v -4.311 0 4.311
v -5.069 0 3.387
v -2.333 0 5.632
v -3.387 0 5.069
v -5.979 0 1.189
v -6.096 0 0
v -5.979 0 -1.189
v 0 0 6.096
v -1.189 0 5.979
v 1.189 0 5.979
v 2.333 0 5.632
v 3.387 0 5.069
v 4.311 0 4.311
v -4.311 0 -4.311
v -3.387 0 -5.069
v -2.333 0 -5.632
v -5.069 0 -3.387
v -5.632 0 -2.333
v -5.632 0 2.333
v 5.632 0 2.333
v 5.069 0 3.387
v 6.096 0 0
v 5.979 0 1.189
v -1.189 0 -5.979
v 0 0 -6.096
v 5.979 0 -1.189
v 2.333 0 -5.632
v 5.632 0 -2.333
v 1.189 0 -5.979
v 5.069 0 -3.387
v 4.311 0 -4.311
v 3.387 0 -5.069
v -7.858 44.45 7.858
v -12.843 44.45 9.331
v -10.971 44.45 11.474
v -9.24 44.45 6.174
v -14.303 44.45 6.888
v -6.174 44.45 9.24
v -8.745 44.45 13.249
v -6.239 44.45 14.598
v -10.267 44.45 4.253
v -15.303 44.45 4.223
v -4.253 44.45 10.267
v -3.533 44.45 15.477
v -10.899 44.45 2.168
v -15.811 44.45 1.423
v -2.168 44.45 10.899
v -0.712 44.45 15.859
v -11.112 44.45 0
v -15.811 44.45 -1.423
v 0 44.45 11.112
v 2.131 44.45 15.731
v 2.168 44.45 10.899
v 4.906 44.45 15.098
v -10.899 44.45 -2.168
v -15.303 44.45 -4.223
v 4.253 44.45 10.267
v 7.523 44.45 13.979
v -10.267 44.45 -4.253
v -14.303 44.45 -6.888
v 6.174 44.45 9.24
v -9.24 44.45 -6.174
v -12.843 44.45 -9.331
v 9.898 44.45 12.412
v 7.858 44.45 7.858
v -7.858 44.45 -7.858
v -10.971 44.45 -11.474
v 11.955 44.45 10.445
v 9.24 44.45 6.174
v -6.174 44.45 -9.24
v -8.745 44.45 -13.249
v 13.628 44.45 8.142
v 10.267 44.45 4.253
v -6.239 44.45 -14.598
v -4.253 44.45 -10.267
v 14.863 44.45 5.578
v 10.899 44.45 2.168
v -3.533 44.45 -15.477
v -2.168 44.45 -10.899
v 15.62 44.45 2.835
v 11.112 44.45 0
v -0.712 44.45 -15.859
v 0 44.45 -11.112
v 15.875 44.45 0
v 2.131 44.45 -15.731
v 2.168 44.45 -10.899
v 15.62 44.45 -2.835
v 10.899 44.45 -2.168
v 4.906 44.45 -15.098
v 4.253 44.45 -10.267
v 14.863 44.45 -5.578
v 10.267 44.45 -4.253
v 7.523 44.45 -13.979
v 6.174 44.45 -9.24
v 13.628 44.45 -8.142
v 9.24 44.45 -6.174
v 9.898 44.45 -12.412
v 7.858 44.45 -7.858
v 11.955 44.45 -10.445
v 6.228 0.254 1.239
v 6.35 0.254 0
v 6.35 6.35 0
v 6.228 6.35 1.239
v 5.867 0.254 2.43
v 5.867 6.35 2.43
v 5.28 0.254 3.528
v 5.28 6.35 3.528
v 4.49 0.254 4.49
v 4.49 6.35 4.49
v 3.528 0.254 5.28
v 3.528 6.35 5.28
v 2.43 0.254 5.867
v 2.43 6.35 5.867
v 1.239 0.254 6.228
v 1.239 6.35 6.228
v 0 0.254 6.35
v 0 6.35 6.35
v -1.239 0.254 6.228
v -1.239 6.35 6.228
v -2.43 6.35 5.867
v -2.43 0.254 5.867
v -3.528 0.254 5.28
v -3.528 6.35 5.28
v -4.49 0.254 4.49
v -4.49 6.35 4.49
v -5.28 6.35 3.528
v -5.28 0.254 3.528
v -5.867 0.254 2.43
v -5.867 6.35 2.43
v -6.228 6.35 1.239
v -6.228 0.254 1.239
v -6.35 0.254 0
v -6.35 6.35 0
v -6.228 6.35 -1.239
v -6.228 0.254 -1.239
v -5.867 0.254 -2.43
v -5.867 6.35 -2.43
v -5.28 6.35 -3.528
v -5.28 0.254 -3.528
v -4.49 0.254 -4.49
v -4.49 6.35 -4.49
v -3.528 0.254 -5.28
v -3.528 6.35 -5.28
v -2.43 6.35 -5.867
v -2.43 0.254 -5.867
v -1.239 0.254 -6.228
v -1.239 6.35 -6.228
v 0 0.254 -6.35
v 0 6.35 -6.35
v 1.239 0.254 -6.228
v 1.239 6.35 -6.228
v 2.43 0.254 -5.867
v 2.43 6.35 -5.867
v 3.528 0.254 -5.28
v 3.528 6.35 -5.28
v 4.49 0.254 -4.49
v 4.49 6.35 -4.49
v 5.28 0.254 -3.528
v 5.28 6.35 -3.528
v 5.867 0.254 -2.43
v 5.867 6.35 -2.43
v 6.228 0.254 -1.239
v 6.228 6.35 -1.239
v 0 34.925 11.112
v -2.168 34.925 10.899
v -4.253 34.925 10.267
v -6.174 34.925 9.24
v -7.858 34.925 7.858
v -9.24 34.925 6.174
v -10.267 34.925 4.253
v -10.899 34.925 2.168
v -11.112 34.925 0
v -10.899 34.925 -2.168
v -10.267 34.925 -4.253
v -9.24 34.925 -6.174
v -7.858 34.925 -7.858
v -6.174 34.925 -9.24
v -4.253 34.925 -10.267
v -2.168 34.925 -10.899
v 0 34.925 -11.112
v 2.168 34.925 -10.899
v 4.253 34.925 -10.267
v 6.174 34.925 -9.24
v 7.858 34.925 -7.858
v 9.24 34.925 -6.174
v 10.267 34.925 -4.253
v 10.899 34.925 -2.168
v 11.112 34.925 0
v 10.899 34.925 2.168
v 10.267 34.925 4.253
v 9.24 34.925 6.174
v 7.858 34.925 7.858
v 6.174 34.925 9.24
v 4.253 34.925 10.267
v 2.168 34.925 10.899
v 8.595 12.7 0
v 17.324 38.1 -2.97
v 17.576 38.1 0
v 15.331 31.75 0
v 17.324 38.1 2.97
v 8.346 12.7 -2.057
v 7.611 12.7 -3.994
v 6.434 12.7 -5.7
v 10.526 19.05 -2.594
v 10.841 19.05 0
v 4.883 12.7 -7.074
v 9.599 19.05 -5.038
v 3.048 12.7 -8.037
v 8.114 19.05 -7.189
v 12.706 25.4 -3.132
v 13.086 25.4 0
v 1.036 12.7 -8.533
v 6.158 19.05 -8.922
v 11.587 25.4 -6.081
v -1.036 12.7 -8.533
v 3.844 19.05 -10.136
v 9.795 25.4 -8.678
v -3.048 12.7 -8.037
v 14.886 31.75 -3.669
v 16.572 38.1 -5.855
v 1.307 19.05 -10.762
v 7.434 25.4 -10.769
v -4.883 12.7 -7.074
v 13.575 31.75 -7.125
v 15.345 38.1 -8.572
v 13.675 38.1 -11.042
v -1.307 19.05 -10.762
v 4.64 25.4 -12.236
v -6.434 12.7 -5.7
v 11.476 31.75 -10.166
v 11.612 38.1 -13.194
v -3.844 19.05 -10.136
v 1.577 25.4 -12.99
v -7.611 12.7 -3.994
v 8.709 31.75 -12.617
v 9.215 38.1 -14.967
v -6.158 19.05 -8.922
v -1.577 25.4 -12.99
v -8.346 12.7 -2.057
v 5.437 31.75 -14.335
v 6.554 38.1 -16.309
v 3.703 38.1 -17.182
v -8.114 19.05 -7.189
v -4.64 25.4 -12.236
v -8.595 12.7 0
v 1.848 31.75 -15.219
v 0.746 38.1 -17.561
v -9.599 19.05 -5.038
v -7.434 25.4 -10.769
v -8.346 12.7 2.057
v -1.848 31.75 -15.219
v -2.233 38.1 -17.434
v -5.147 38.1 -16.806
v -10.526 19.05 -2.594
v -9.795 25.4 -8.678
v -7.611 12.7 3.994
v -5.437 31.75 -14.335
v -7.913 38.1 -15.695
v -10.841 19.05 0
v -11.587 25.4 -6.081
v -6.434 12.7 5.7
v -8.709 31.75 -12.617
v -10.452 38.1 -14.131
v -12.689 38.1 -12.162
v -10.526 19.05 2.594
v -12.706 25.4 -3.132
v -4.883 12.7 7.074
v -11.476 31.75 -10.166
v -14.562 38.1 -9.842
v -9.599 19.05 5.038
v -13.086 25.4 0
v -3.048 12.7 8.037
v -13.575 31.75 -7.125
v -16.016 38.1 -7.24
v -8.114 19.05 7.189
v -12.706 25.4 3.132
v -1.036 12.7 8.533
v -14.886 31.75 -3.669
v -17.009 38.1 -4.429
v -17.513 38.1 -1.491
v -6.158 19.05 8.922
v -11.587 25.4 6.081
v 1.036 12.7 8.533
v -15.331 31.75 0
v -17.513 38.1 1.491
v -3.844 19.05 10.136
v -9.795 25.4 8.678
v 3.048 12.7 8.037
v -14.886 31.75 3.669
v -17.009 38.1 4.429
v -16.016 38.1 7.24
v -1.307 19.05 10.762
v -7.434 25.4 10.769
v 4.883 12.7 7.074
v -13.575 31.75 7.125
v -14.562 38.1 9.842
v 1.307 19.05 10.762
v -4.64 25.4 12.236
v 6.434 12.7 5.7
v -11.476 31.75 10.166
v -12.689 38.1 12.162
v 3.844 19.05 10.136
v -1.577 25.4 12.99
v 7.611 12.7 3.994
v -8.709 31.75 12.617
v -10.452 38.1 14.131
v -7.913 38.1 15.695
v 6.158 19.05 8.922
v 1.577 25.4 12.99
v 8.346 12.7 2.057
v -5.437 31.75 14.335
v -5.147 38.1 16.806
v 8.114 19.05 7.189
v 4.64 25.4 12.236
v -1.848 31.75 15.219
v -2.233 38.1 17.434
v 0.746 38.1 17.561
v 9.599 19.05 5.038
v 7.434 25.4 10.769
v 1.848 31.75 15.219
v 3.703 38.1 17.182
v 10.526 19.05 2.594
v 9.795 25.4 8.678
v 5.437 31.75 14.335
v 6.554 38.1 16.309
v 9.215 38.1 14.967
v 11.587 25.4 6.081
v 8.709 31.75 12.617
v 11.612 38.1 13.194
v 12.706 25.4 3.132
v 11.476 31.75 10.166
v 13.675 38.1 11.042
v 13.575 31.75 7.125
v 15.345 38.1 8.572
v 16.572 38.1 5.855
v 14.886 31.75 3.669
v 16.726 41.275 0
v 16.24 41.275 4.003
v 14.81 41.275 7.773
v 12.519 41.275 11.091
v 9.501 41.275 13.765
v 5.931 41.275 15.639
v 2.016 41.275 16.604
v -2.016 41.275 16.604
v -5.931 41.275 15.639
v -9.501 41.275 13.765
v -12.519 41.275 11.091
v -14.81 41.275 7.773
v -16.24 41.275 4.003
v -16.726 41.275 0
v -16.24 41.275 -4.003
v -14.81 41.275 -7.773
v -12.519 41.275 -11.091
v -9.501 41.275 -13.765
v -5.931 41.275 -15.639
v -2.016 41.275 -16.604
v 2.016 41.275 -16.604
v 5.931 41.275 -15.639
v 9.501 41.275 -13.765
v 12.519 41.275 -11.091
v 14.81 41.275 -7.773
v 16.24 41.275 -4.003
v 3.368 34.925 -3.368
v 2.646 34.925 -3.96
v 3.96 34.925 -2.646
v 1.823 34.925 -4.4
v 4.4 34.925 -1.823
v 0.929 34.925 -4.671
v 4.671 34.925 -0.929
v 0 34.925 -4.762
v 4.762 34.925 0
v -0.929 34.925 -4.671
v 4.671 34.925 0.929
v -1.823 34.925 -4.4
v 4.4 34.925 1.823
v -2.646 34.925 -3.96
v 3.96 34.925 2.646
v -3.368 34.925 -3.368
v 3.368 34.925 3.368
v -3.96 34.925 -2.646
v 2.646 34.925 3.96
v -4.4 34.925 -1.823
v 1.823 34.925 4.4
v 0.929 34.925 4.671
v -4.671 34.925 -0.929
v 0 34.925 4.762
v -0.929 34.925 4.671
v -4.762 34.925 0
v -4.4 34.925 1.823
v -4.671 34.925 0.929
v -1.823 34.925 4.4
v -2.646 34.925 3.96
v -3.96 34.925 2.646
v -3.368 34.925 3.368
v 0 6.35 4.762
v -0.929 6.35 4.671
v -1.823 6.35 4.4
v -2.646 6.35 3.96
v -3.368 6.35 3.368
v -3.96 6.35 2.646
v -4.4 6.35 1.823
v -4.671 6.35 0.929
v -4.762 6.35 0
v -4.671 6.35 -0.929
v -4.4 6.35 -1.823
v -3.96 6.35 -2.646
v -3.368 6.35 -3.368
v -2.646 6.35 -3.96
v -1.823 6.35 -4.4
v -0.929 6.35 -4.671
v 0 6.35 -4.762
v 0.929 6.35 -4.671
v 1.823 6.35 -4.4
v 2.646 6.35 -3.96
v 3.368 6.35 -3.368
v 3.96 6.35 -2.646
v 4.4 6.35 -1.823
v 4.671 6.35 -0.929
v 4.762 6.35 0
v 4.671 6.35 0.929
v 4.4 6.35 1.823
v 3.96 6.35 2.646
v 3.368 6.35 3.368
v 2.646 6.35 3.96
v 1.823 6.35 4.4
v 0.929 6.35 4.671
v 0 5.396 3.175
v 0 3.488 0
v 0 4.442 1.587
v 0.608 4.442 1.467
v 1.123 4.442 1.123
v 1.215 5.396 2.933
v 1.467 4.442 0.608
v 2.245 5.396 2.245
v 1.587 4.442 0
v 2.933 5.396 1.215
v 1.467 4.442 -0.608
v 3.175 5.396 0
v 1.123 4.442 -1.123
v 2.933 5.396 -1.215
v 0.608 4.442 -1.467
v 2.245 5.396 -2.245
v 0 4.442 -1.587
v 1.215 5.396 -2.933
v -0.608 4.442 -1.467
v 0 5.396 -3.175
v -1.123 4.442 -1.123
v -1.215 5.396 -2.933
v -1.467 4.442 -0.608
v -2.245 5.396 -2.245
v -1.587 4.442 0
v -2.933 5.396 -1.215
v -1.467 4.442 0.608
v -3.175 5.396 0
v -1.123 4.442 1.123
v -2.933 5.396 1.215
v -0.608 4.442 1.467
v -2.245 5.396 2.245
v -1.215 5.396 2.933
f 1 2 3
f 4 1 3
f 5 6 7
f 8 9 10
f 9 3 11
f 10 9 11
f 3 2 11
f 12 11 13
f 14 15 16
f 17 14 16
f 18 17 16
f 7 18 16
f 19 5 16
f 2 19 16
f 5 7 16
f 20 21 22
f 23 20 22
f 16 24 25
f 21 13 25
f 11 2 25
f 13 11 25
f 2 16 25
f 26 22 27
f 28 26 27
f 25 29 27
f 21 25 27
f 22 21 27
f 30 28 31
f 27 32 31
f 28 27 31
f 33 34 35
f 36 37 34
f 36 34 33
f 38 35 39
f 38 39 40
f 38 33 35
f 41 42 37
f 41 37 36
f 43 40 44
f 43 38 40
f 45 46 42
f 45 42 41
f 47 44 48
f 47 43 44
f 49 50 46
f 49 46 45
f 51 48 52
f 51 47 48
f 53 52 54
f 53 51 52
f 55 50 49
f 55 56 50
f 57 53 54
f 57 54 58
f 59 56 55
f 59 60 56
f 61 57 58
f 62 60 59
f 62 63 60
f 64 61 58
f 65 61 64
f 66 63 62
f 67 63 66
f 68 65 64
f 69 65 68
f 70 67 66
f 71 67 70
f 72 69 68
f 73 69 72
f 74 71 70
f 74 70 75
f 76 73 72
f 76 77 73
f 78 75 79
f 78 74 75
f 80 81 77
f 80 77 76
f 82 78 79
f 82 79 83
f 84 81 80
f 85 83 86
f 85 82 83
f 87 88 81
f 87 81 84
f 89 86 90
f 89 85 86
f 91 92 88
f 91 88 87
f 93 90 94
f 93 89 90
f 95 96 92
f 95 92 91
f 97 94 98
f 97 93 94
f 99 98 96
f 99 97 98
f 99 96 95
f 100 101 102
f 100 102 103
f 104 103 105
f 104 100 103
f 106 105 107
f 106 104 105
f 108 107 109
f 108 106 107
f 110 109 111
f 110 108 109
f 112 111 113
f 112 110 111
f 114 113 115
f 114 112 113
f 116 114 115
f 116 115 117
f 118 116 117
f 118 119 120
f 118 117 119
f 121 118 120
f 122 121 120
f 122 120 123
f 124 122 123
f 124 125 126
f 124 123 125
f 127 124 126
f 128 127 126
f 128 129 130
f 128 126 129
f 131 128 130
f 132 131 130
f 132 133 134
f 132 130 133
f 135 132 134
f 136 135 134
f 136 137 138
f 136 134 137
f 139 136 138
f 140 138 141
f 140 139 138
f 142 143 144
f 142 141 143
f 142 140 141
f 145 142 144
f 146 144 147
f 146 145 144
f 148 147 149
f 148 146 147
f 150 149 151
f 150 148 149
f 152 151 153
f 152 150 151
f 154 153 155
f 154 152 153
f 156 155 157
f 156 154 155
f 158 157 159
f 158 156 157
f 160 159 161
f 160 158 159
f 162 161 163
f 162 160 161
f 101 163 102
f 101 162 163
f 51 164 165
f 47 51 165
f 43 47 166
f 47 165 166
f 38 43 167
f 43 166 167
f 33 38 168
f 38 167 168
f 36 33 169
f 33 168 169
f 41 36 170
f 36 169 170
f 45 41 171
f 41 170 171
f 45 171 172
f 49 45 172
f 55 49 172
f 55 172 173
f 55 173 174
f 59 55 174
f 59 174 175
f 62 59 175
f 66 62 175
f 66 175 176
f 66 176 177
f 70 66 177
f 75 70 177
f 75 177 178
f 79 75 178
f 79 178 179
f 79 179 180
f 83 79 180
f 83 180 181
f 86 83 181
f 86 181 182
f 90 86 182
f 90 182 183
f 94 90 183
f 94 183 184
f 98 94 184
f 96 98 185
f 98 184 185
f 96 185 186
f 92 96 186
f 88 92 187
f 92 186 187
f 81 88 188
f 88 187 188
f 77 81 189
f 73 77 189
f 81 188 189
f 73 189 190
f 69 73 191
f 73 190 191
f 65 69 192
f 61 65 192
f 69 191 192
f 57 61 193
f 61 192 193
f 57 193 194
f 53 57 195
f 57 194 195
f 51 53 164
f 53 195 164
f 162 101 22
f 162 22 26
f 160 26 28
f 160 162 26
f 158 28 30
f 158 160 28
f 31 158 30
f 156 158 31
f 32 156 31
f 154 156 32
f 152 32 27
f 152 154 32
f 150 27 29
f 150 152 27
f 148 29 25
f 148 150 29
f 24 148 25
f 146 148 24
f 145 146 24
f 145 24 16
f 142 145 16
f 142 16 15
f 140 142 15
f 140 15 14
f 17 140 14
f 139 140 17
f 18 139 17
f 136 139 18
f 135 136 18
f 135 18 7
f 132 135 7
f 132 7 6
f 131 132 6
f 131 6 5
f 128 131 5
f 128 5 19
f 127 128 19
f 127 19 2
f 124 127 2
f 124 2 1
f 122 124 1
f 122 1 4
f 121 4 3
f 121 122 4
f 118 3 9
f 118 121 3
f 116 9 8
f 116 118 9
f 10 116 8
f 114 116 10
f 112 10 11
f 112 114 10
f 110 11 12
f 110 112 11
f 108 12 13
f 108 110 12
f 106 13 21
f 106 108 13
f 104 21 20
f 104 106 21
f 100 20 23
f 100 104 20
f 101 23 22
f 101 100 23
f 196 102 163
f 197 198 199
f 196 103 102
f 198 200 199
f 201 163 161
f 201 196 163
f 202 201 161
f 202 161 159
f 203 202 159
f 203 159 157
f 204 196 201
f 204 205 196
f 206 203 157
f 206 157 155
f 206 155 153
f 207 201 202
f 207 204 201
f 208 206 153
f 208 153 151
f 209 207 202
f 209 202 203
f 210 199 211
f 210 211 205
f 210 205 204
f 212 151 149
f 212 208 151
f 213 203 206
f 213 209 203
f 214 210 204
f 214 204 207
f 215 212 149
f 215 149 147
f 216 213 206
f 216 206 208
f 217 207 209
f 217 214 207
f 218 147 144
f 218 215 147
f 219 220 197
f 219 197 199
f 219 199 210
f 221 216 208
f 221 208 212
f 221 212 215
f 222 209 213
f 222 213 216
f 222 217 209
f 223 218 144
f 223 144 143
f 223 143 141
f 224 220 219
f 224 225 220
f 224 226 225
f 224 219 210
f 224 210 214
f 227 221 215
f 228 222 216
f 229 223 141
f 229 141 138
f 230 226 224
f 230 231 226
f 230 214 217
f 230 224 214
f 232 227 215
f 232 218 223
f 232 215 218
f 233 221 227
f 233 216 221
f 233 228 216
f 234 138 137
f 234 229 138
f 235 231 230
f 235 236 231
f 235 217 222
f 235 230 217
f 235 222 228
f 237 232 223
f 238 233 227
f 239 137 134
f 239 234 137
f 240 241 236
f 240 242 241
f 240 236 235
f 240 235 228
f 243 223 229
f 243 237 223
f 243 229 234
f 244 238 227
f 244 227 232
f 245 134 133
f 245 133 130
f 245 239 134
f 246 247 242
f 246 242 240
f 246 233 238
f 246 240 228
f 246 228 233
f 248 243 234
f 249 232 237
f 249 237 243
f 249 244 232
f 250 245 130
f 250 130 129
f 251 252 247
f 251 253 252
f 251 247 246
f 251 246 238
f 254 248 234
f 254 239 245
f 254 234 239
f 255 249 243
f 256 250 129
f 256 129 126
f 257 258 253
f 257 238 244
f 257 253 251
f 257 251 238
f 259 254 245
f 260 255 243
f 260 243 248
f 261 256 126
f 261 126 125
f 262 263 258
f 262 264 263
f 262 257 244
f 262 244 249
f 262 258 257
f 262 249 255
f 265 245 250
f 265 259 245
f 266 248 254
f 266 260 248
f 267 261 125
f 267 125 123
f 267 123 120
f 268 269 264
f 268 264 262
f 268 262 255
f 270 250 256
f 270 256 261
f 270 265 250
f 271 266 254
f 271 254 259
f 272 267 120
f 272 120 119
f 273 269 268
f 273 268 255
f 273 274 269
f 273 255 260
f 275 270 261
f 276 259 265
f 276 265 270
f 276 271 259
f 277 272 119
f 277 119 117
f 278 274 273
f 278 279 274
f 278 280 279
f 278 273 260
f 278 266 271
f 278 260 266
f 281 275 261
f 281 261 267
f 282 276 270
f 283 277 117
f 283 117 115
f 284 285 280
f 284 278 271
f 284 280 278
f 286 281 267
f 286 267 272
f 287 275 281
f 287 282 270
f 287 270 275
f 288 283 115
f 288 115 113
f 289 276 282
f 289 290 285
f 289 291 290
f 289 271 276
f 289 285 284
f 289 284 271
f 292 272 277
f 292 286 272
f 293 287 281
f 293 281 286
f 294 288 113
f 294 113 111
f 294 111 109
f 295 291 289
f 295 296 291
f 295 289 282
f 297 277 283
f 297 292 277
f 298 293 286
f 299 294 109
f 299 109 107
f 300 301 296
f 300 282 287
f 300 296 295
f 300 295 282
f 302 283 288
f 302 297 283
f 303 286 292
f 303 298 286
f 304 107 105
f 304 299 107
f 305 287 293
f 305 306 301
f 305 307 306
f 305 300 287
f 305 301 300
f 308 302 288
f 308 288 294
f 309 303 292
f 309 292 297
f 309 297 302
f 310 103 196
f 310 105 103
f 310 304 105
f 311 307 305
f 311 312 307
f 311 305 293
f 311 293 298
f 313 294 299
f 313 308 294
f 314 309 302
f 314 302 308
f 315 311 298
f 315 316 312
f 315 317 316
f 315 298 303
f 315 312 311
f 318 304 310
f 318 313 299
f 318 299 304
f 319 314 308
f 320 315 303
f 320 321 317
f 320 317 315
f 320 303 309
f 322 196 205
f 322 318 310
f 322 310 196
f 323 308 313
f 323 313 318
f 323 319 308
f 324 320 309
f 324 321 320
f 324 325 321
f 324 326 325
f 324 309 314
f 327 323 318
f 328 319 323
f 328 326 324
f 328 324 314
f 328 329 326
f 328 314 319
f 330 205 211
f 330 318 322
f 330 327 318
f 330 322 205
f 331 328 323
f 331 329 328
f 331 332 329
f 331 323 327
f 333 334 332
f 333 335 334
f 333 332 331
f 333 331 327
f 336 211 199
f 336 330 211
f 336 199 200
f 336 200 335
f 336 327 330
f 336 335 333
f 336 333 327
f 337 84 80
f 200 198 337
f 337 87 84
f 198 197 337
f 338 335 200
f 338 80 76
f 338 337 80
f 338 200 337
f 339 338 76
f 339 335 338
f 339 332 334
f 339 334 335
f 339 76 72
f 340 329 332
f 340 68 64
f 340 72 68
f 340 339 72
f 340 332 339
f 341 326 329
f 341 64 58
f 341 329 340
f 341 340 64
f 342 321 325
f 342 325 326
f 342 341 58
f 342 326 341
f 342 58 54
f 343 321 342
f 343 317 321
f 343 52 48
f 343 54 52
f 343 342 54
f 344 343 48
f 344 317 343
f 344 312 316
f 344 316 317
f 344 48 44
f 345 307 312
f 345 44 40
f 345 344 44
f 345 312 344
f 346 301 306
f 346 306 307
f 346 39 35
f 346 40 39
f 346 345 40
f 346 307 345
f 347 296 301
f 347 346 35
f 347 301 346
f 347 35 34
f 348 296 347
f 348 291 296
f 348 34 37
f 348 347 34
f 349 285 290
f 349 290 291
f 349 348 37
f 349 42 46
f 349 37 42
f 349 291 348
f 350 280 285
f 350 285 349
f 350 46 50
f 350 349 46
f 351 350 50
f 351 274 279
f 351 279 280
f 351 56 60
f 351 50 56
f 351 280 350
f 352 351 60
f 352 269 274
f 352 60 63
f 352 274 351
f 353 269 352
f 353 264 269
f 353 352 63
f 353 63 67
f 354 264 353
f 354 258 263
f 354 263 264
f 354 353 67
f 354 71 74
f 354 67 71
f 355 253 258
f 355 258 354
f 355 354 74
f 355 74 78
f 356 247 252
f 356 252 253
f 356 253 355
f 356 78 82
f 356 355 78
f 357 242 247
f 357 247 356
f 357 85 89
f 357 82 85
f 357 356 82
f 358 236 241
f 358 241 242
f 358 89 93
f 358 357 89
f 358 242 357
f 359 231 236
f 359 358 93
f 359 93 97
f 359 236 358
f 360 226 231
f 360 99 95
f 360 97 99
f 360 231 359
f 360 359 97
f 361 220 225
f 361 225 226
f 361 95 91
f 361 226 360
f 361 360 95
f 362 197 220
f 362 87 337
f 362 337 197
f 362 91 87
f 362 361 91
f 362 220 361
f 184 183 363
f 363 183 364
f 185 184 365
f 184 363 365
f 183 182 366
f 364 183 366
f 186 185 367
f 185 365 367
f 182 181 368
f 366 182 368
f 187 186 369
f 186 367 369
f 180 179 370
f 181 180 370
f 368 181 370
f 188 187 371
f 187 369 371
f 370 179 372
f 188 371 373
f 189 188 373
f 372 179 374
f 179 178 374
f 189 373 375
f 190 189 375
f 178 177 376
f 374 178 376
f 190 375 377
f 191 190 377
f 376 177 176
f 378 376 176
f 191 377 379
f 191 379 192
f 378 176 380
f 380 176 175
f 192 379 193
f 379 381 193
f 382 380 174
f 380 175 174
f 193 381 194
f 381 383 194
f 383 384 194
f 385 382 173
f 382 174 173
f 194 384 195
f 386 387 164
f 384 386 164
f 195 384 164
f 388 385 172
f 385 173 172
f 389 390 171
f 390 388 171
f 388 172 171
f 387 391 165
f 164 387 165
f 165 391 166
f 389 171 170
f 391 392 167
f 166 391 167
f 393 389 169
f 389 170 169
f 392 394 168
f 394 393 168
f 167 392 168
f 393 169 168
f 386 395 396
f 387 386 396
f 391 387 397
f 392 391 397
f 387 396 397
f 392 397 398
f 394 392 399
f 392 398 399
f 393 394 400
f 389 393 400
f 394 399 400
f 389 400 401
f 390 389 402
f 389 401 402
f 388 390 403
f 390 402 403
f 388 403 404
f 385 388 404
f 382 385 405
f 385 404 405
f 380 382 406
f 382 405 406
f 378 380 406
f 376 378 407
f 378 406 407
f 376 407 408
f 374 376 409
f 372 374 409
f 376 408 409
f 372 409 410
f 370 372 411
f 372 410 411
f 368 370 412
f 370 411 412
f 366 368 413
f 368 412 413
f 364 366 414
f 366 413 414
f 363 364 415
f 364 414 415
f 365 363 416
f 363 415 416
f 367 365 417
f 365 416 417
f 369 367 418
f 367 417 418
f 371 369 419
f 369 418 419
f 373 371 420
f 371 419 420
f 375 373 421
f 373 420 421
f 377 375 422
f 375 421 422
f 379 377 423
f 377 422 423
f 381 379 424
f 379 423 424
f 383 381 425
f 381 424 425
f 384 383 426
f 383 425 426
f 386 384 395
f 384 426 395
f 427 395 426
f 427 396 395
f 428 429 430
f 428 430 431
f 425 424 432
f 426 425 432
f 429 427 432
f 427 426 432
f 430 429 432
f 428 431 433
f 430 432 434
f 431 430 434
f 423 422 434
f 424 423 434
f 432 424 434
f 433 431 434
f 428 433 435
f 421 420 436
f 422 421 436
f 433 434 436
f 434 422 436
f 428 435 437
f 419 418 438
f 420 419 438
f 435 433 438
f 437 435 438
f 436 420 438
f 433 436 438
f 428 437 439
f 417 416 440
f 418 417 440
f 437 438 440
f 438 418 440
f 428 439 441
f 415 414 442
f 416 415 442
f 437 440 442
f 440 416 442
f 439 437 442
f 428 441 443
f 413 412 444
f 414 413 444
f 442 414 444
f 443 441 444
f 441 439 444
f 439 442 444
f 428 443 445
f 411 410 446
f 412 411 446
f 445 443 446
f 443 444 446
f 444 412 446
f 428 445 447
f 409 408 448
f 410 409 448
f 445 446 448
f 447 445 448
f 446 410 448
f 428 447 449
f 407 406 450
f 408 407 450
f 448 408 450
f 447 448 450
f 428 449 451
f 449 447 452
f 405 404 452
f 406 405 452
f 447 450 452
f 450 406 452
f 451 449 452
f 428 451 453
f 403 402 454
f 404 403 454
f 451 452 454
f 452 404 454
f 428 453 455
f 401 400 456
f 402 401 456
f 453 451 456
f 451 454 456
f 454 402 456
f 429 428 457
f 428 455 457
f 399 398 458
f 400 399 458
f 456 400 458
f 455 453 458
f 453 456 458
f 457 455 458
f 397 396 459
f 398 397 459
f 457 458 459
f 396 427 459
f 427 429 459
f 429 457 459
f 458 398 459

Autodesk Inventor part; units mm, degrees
ref_plane "YZ Plane" through (0, 0, 0) normal (1, 0, 0) x (0, 1, 0)
ref_plane "XZ Plane" through (0, 0, 0) normal (0, 1, 0) x (-1, 0, 0)
ref_plane "XY Plane" through (0, 0, 0) normal (0, 0, 1) x (1, 0, 0)
sketch "Sketch1" plane through (0, 0, 0) normal (0, 0, 1) x (1, 0, 0)
  line L0 (15.875, 44.45) -> (17.5765, 38.1)
  line L1 (17.5765, 38.1) -> (6.35, 6.35)
  line L2 (6.35, 6.35) -> (6.35, 0)
  line L3 (6.35, 0) -> (0, 0)
  line L4 (0, 0) -> (0, 44.45)
  line L5 (15.875, 44.45) -> (0, 44.45)
  dimension "d0" = 6.35
  dimension "d1" = 6.35
  dimension "d2" = 44.45
  dimension "d3" = 75
  dimension "d4" = 38.1
revolve "Revolution1" add sketch "Sketch1" angle 360 about axis through (0, 0, 0) along (0, 1, 0)
sketch "Sketch2" plane through (0, 44.45, 0) normal (0, 1, 0) x (1, 0, 0)
  point P0 (0, 0)
  point P1 (0, 0)
hole "Hole1" at (0, 44.45, 0) direction (0, -1, 0) diameter 9.525 depth 38.1 tip angle 118 counterbore diameter 22.225 counterbore depth 9.525
chamfer "Chamfer1" distance 0.254 angle 45 1 edges at (-6.35, 0, 0)
properties part number "Stack"
